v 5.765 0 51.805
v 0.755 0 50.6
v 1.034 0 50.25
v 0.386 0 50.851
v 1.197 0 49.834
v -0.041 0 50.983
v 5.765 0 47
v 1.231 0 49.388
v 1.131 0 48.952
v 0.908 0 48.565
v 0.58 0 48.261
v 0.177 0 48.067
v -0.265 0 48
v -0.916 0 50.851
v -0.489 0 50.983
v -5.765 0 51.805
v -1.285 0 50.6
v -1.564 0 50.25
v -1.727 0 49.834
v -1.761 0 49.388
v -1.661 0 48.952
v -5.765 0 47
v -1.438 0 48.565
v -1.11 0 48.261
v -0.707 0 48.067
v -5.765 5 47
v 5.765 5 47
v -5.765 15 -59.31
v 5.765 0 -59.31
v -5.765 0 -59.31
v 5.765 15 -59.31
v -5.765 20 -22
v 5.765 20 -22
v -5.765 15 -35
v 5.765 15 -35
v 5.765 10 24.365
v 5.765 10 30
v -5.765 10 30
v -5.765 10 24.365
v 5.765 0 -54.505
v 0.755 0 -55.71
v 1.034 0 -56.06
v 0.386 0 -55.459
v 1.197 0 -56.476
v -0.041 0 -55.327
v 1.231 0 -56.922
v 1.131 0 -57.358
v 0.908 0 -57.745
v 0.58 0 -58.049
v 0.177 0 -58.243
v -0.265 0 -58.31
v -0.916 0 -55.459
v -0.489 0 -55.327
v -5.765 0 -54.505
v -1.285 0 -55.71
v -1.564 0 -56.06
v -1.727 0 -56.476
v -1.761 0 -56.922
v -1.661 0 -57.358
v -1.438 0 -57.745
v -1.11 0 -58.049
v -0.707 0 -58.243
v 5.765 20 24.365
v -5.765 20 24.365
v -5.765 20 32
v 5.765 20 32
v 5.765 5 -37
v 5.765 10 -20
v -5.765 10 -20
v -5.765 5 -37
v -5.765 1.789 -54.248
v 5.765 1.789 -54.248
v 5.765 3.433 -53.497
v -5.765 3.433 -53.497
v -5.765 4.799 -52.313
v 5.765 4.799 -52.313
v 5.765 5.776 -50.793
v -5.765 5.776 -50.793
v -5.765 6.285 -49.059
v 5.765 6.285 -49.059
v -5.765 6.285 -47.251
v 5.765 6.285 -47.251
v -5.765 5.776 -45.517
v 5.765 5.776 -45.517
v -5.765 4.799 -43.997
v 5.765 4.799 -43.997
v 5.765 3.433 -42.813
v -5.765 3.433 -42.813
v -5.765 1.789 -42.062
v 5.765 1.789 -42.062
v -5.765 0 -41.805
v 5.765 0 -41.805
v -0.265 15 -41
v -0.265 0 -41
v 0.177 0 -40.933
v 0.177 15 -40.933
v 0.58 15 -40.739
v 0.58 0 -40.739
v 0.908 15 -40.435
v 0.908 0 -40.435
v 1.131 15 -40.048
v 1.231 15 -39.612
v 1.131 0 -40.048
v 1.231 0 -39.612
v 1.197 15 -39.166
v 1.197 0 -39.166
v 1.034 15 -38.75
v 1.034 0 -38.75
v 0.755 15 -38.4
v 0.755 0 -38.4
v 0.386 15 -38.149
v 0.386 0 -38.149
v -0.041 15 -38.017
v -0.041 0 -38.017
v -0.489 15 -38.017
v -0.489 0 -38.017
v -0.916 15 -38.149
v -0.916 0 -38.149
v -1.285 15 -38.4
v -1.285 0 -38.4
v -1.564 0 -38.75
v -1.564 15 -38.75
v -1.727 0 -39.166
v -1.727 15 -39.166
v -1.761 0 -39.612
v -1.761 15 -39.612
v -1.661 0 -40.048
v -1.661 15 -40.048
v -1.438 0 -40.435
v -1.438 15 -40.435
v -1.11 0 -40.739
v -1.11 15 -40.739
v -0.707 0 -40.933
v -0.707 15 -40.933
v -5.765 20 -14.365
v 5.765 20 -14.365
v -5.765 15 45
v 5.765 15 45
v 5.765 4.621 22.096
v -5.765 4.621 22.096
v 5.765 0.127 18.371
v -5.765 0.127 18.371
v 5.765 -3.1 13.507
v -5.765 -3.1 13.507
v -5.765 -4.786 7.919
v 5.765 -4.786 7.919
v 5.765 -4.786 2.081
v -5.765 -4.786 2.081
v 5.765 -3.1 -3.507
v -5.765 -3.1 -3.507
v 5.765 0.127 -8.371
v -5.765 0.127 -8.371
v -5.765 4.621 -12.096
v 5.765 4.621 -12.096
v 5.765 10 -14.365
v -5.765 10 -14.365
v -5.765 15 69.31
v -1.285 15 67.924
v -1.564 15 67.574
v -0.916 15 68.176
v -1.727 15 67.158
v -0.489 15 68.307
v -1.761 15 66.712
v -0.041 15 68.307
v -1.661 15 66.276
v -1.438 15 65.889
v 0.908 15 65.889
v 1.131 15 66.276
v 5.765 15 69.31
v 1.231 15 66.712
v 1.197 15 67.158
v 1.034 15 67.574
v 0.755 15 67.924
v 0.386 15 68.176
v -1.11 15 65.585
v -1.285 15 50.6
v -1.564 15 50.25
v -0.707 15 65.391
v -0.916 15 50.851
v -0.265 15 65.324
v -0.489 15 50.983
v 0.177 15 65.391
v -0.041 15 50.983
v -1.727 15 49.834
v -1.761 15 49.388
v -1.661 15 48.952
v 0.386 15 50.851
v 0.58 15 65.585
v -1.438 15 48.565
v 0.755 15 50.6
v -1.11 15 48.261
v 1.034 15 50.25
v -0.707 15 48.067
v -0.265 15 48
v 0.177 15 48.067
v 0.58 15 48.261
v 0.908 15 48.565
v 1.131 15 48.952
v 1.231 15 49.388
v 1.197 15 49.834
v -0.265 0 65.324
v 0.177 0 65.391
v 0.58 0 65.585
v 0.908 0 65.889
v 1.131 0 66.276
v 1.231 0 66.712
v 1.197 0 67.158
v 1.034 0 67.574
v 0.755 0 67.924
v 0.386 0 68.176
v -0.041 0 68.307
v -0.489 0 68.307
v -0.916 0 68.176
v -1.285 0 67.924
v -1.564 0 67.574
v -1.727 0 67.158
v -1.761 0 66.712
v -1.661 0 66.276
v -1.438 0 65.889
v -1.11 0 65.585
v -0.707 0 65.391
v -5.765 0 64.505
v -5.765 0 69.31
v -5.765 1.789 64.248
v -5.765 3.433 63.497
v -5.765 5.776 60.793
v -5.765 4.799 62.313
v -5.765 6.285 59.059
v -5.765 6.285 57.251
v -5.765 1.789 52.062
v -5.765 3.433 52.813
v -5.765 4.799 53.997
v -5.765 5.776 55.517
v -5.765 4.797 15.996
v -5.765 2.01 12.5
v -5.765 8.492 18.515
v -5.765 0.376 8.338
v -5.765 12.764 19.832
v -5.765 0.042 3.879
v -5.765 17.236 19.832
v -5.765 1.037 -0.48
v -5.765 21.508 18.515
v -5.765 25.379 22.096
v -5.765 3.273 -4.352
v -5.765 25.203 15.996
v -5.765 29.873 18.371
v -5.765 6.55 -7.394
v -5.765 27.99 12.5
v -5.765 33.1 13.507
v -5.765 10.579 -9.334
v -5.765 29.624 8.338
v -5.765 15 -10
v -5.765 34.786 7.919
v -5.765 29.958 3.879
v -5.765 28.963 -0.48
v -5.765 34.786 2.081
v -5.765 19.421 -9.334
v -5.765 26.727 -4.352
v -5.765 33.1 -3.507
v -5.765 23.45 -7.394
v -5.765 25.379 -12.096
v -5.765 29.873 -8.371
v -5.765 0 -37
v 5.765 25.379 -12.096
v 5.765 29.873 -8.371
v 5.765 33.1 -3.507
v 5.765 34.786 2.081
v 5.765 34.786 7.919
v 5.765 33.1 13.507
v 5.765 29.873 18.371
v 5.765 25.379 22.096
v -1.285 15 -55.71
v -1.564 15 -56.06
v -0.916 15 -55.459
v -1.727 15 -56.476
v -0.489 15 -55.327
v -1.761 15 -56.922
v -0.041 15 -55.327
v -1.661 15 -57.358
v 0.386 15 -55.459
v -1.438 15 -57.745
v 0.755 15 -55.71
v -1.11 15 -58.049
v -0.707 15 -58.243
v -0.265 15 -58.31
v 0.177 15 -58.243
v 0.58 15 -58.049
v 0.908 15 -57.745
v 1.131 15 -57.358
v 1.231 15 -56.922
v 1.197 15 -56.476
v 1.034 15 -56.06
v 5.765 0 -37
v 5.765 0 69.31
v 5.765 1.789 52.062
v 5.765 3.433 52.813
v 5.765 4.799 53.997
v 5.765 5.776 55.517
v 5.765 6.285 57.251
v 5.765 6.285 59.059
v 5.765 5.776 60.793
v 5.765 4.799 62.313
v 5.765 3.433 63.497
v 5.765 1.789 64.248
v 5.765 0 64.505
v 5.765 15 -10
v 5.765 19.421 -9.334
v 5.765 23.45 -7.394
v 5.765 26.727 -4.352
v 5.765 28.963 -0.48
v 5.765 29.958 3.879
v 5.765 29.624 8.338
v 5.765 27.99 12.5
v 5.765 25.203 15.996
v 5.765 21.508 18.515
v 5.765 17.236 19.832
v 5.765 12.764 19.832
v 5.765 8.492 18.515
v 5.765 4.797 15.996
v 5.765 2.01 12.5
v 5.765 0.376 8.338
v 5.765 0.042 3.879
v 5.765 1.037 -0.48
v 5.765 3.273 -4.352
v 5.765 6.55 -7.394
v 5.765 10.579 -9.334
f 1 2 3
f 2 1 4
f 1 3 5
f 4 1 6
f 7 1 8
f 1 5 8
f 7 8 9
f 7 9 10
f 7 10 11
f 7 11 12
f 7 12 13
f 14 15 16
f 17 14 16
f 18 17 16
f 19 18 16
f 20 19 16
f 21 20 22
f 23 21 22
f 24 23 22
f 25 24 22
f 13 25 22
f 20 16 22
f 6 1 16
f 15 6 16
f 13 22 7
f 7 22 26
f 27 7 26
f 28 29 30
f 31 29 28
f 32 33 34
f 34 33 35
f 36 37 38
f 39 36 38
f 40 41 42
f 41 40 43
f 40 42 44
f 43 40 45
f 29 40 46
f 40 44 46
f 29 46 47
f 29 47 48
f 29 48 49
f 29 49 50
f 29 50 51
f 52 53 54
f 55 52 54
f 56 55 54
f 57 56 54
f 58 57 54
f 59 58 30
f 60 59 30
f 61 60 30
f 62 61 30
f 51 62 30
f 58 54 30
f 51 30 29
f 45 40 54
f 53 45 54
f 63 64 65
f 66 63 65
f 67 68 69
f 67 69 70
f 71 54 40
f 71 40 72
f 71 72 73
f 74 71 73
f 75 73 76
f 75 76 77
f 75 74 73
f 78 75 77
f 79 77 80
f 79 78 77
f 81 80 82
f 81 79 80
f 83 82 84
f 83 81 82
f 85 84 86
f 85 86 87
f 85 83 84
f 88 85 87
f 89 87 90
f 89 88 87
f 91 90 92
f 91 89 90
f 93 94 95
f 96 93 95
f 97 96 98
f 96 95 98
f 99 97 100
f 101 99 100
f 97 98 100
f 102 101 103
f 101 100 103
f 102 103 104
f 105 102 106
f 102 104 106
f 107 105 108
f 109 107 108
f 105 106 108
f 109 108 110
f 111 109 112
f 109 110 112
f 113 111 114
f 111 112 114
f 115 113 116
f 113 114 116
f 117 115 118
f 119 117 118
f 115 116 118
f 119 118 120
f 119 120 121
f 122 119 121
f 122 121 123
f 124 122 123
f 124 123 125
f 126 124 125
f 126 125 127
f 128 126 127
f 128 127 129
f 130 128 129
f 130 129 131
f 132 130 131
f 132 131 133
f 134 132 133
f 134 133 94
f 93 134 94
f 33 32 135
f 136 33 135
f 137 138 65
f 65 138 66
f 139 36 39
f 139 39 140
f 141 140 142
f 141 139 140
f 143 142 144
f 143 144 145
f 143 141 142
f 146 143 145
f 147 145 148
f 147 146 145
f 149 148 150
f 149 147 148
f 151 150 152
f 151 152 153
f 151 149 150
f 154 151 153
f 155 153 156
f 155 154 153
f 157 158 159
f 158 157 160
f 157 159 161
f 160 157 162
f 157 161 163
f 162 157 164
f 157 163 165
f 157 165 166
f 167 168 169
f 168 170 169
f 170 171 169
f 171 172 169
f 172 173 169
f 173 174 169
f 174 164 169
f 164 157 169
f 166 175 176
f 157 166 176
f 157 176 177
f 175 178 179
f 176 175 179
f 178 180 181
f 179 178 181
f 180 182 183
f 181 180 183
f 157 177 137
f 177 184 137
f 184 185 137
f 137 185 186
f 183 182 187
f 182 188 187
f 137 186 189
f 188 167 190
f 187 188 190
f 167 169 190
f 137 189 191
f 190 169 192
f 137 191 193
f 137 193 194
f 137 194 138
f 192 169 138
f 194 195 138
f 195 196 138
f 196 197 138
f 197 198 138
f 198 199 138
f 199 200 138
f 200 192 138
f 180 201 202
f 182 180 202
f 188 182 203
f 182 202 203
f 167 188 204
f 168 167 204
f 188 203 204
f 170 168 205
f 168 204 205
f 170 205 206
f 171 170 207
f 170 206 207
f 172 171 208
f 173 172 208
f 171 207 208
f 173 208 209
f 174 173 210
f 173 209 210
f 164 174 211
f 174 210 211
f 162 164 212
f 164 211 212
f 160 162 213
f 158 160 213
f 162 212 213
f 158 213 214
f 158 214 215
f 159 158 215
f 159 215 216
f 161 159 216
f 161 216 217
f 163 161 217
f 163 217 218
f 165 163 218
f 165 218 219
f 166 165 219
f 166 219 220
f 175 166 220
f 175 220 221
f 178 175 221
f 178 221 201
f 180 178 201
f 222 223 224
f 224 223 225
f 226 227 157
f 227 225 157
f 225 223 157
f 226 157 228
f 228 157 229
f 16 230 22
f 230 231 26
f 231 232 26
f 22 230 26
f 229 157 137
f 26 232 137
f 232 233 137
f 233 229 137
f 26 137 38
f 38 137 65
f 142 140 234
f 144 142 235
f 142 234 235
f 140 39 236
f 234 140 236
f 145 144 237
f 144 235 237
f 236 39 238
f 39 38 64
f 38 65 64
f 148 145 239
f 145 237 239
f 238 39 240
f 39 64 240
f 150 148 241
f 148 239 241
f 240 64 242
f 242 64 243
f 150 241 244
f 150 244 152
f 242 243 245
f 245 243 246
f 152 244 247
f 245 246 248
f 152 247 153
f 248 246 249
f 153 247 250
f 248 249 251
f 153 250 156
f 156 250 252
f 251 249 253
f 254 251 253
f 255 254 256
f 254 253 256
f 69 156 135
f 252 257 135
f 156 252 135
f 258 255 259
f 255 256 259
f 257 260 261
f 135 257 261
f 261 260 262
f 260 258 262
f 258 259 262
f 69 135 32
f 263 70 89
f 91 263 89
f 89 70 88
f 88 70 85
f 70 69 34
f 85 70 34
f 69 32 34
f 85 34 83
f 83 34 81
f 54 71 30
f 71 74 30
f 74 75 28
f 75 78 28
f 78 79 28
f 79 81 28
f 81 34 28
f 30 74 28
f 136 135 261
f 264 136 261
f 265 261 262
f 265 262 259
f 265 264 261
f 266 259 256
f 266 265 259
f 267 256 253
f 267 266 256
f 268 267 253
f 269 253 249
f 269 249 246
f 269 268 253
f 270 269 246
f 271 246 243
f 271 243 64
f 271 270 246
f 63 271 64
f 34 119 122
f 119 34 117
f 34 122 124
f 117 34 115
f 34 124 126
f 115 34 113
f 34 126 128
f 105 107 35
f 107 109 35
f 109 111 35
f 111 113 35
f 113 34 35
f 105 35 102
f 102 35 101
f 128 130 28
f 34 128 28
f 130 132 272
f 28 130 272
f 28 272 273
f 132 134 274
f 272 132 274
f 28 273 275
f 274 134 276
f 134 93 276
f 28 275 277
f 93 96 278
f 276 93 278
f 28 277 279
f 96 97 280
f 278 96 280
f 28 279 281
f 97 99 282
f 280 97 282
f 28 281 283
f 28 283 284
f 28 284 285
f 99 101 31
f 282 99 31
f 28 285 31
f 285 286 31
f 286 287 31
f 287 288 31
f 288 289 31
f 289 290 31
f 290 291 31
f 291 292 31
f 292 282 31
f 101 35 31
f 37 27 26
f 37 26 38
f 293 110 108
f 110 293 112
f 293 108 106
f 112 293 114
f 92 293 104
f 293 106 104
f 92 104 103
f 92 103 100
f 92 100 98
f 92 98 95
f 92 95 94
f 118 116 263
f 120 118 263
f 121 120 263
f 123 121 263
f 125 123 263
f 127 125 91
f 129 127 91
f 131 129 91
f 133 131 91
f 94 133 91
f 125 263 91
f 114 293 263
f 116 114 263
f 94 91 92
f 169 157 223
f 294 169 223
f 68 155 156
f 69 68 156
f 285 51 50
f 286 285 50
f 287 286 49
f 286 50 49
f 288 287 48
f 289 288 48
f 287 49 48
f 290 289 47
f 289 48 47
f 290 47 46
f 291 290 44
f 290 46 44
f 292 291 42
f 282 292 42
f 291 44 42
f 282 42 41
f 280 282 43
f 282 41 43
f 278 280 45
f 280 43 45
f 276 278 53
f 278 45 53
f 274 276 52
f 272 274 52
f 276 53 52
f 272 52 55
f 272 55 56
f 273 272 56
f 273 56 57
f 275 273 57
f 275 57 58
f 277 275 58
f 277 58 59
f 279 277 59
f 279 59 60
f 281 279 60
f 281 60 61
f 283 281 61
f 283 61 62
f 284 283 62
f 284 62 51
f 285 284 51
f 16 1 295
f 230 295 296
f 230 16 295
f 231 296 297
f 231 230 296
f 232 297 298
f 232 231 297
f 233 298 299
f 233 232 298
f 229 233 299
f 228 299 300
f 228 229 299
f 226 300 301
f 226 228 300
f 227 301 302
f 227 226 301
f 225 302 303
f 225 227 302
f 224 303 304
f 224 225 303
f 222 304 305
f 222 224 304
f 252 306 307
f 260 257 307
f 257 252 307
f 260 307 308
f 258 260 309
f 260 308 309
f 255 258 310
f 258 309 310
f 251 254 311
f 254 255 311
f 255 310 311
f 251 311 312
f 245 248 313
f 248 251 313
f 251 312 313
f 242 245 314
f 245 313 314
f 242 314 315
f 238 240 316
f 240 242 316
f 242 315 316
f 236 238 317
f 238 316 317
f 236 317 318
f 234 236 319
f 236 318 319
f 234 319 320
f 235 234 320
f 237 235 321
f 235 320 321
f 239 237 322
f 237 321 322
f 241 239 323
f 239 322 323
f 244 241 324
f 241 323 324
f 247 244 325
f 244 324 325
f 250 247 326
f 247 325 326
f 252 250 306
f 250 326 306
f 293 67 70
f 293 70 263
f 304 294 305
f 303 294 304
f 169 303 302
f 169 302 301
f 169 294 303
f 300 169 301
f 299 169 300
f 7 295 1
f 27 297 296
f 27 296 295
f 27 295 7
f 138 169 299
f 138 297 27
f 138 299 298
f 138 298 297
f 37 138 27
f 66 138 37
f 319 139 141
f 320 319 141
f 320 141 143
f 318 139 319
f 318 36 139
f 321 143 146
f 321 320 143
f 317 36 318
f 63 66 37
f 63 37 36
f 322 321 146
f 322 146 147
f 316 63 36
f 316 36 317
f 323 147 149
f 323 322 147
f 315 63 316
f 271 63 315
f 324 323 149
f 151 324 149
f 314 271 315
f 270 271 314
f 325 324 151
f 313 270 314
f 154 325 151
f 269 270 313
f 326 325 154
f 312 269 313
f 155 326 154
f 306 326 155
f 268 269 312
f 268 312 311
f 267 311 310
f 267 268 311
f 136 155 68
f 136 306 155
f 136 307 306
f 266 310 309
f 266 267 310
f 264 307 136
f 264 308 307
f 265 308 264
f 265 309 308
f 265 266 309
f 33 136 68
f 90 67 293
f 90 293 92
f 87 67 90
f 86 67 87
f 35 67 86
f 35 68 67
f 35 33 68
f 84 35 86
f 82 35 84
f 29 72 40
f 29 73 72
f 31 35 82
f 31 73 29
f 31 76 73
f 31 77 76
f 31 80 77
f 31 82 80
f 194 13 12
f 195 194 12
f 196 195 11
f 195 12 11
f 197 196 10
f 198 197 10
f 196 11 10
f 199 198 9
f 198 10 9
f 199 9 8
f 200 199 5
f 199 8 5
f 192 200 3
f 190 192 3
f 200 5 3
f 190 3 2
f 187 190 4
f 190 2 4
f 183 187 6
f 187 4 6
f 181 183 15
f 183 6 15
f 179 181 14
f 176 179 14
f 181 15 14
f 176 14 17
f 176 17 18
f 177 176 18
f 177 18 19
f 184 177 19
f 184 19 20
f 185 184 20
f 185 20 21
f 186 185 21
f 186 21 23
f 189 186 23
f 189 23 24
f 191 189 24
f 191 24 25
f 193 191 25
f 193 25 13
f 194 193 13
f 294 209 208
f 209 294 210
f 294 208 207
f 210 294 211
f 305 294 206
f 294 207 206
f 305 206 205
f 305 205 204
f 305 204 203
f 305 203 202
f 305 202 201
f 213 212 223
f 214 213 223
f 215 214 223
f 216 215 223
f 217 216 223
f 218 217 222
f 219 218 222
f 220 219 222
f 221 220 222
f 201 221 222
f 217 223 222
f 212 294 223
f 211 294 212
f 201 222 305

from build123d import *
from build123d.topology import SkipClean

# Parameters (mm, degrees)
SKETCH1_R            = 5.765
SKETCH1_R_2          = 4.765
BOSS_EXTRUDE1_DEPTH  = 10
SKETCH2_W            = 11.53
SKETCH2_H            = 10
BOSS_EXTRUDE2_DEPTH  = 10
SKETCH3_R            = 4.765
CUT_EXTRUDE1_DEPTH   = 10
BOSS_EXTRUDE5_DEPTH  = 10
SKETCH9_R            = 3.5
CUT_EXTRUDE4_DEPTH   = 26.158316716
SKETCH11_W           = 11.53
SKETCH11_H           = 10
BOSS_EXTRUDE6_DEPTH  = 48.155
SKETCH12_R           = 6.35
BOSS_EXTRUDE7_DEPTH  = 5.765
SKETCH13_W           = 10
SKETCH13_H           = 20
CUT_EXTRUDE5_DEPTH   = 11.53
CUT_EXTRUDE6_DEPTH   = 11.53
SKETCH15_W           = 10
SKETCH15_H           = 10
CUT_EXTRUDE7_DEPTH   = 11.53
SKETCH17_W           = 11.204655182
SKETCH17_H           = 10
BOSS_EXTRUDE10_DEPTH = 11.53
CUT_EXTRUDE9_DEPTH   = 74.053521476
SKETCH20_R           = 1.5
CUT_EXTRUDE10_DEPTH  = 73.36788877
CUT_EXTRUDE11_DEPTH  = 74.053521476
BOSS_EXTRUDE11_DEPTH = 11.53
SKETCH25_R           = 20
SKETCH25_R_2         = 15
BOSS_EXTRUDE12_DEPTH = 11.53
SKETCH26_R           = 15
CUT_EXTRUDE12_DEPTH  = 79.49724199


with BuildPart() as part:
    # Sketch1 → Boss-Extrude1 (new body)
    with BuildSketch(Plane.XY):
        Circle(SKETCH1_R)
        Circle(SKETCH1_R_2, mode=Mode.SUBTRACT)
    extrude(amount=BOSS_EXTRUDE1_DEPTH)

    # Sketch2 → Boss-Extrude2 (add)
    with BuildSketch(Plane(origin=(0, 0, 0), x_dir=(1, 0, 0), z_dir=(0, 1, 0))):
        with Locations((0, -5)):
            Rectangle(SKETCH2_W, SKETCH2_H)
    boss_extrude2 = extrude(amount=BOSS_EXTRUDE2_DEPTH)

    # Sketch3 → Cut-Extrude1 (cut)
    with SkipClean():  # the faces are left unmerged after this step: merging them gives an invalid solid
        with BuildSketch(Plane(origin=(0, 0, 0), x_dir=(-1, 0, 0), z_dir=(0, 0, -1))):
            Circle(SKETCH3_R)
        extrude(amount=-CUT_EXTRUDE1_DEPTH, mode=Mode.SUBTRACT)

    # Sketch8 → Boss-Extrude5 (add)
    with SkipClean():  # the faces are left unmerged after this step: merging them gives an invalid solid
        with BuildSketch(Plane(origin=(0, 10, 0), x_dir=(1, 0, 0), z_dir=(0, 1, 0))):
            Polygon((-5.765, 0), (-5.765, -10), (-2.765, -10), (2.765, -10), (5.765, -10), (5.765, 0), (2.765, 0), (-2.765, 0), align=None)
        boss_extrude5 = extrude(amount=BOSS_EXTRUDE5_DEPTH)

    # Sketch9 → Cut-Extrude4 (cut, through all)
    with SkipClean():  # the faces are left unmerged after this step: merging them gives an invalid solid
        with BuildSketch(Plane(origin=(5.765, 0, 0), x_dir=(0, 0, -1), z_dir=(1, 0, 0))):
            with Locations((-5, 15)):
                Circle(SKETCH9_R)
        cut_extrude4 = extrude(amount=-CUT_EXTRUDE4_DEPTH, mode=Mode.SUBTRACT)

    # Sketch11 → Boss-Extrude6 (add)
    with SkipClean():  # the faces are left unmerged after this step: merging them gives an invalid solid
        with BuildSketch(Plane(origin=(0, 0, 0), x_dir=(-1, 0, 0), z_dir=(0, 0, -1))):
            with Locations((0, 15)):
                Rectangle(SKETCH11_W, SKETCH11_H)
        boss_extrude6 = extrude(amount=BOSS_EXTRUDE6_DEPTH)

    # Sketch12 → Boss-Extrude7 (add, symmetric)
    with SkipClean():  # the faces are left unmerged after this step: merging them gives an invalid solid
        with BuildSketch(Plane(origin=(0, 0, 0), x_dir=(0, 0, -1), z_dir=(1, 0, 0))):
            with BuildLine():
                Line((59.31, 0), (59.31, 20))
                Line((59.31, 20), (47, 20))
                Line((47, 20), (37, 20))
                Line((37, 20), (37, 0))
                ThreePointArc((37, 0), (48.155, -11.155), (59.31, 0))
            make_face()
            with Locations((48.155, 0)):
                Circle(SKETCH12_R, mode=Mode.SUBTRACT)
        boss_extrude7 = extrude(amount=BOSS_EXTRUDE7_DEPTH, both=True)

    # Sketch13 → Cut-Extrude5 (cut)
    with BuildSketch(Plane.ZY.offset(5.765)):
        with Locations((5, 0)):
            Rectangle(SKETCH13_W, SKETCH13_H)
    extrude(amount=-CUT_EXTRUDE5_DEPTH, mode=Mode.SUBTRACT)

    # Sketch14 → Cut-Extrude6 (cut)
    with BuildSketch(Plane.ZY.offset(5.765)):
        Polygon((5, 18.5), (5, 10), (10, 10), (10, 18.5), (10, 20), (5, 20), align=None)
    cut_extrude6 = extrude(amount=-CUT_EXTRUDE6_DEPTH, mode=Mode.SUBTRACT)

    # Mirror1: Boss-Extrude2, Boss-Extrude5, Cut-Extrude4, Boss-Extrude6, Boss-Extrude7, Cut-Extrude6 across plane
    add(boss_extrude2.mirror(Plane(origin=(5.765, 18.5, 5), x_dir=(1, 0, 0), z_dir=(0, 0, -1))))
    add(boss_extrude5.mirror(Plane(origin=(5.765, 18.5, 5), x_dir=(1, 0, 0), z_dir=(0, 0, -1))))
    add(cut_extrude4.mirror(Plane(origin=(5.765, 18.5, 5), x_dir=(1, 0, 0), z_dir=(0, 0, -1))), mode=Mode.SUBTRACT)
    add(boss_extrude6.mirror(Plane(origin=(5.765, 18.5, 5), x_dir=(1, 0, 0), z_dir=(0, 0, -1))))
    add(boss_extrude7.mirror(Plane(origin=(5.765, 18.5, 5), x_dir=(1, 0, 0), z_dir=(0, 0, -1))))
    add(cut_extrude6.mirror(Plane(origin=(5.765, 18.5, 5), x_dir=(1, 0, 0), z_dir=(0, 0, -1))), mode=Mode.SUBTRACT)

    # Sketch15 → Cut-Extrude7 (cut)
    with BuildSketch(Plane.ZY.offset(5.765)):
        with Locations((5, 5)):
            Rectangle(SKETCH15_W, SKETCH15_H)
    extrude(amount=-CUT_EXTRUDE7_DEPTH, mode=Mode.SUBTRACT)

    # Sketch17 → Boss-Extrude10 (add)
    with BuildSketch(Plane.ZY.offset(5.765)):
        with Locations((1.267367683, 15)):
            Rectangle(SKETCH17_W, SKETCH17_H)
    extrude(amount=-BOSS_EXTRUDE10_DEPTH)

    # Sketch19 → Cut-Extrude9 (cut, through all)
    with BuildSketch(Plane.ZY.offset(5.765)):
        Polygon((-41.805, 0), (69.31, 0), (69.31, -15), (-59.31, -15), (-59.31, 0), align=None)
    extrude(amount=-CUT_EXTRUDE9_DEPTH, mode=Mode.SUBTRACT)

    # Sketch20 → Cut-Extrude10 (cut, through all)
    with BuildSketch(Plane(origin=(0, 0, 0), x_dir=(-1, 0, 0), z_dir=(0, -1, 0))):
        with Locations((0.265, 56.81)):
            Circle(SKETCH20_R)
        with Locations((0.265, 39.5)):
            Circle(SKETCH20_R)
        with Locations((0.265, -66.824084676)):
            Circle(SKETCH20_R)
        with Locations((0.265, -49.5)):
            Circle(SKETCH20_R)
    extrude(amount=-CUT_EXTRUDE10_DEPTH, mode=Mode.SUBTRACT)

    # Sketch22 → Cut-Extrude11 (cut, through all)
    with BuildSketch(Plane(origin=(5.765, 0, 0), x_dir=(0, 0, -1), z_dir=(1, 0, 0))):
        Polygon((22, 20), (35, 15), (59.31, 15), (59.31, 20), align=None)
        Polygon((-69.31, 20), (-69.31, 15), (-45, 15), (-32, 20), align=None)
    extrude(amount=-CUT_EXTRUDE11_DEPTH, mode=Mode.SUBTRACT)

    # Sketch23 → Boss-Extrude11 (add)
    with BuildSketch(Plane(origin=(5.765, 0, 0), x_dir=(0, 0, -1), z_dir=(1, 0, 0))):
        Polygon((-47, 10), (-47, 5), (-30, 10), align=None)
        Polygon((37, 10), (20, 10), (37, 5), align=None)
    extrude(amount=-BOSS_EXTRUDE11_DEPTH)

    # Sketch25 → Boss-Extrude12 (add)
    with BuildSketch(Plane(origin=(5.765, 0, 0), x_dir=(0, 0, -1), z_dir=(1, 0, 0))):
        with Locations((-5, 15)):
            Circle(SKETCH25_R)
        with Locations((-5, 15)):
            Circle(SKETCH25_R_2, mode=Mode.SUBTRACT)
    extrude(amount=-BOSS_EXTRUDE12_DEPTH)

    # Sketch26 → Cut-Extrude12 (cut, through all)
    with BuildSketch(Plane(origin=(5.765, 0, 0), x_dir=(0, 0, -1), z_dir=(1, 0, 0))):
        with Locations((-5, 15)):
            Circle(SKETCH26_R)
    extrude(amount=-CUT_EXTRUDE12_DEPTH, mode=Mode.SUBTRACT)


solid = part.part
